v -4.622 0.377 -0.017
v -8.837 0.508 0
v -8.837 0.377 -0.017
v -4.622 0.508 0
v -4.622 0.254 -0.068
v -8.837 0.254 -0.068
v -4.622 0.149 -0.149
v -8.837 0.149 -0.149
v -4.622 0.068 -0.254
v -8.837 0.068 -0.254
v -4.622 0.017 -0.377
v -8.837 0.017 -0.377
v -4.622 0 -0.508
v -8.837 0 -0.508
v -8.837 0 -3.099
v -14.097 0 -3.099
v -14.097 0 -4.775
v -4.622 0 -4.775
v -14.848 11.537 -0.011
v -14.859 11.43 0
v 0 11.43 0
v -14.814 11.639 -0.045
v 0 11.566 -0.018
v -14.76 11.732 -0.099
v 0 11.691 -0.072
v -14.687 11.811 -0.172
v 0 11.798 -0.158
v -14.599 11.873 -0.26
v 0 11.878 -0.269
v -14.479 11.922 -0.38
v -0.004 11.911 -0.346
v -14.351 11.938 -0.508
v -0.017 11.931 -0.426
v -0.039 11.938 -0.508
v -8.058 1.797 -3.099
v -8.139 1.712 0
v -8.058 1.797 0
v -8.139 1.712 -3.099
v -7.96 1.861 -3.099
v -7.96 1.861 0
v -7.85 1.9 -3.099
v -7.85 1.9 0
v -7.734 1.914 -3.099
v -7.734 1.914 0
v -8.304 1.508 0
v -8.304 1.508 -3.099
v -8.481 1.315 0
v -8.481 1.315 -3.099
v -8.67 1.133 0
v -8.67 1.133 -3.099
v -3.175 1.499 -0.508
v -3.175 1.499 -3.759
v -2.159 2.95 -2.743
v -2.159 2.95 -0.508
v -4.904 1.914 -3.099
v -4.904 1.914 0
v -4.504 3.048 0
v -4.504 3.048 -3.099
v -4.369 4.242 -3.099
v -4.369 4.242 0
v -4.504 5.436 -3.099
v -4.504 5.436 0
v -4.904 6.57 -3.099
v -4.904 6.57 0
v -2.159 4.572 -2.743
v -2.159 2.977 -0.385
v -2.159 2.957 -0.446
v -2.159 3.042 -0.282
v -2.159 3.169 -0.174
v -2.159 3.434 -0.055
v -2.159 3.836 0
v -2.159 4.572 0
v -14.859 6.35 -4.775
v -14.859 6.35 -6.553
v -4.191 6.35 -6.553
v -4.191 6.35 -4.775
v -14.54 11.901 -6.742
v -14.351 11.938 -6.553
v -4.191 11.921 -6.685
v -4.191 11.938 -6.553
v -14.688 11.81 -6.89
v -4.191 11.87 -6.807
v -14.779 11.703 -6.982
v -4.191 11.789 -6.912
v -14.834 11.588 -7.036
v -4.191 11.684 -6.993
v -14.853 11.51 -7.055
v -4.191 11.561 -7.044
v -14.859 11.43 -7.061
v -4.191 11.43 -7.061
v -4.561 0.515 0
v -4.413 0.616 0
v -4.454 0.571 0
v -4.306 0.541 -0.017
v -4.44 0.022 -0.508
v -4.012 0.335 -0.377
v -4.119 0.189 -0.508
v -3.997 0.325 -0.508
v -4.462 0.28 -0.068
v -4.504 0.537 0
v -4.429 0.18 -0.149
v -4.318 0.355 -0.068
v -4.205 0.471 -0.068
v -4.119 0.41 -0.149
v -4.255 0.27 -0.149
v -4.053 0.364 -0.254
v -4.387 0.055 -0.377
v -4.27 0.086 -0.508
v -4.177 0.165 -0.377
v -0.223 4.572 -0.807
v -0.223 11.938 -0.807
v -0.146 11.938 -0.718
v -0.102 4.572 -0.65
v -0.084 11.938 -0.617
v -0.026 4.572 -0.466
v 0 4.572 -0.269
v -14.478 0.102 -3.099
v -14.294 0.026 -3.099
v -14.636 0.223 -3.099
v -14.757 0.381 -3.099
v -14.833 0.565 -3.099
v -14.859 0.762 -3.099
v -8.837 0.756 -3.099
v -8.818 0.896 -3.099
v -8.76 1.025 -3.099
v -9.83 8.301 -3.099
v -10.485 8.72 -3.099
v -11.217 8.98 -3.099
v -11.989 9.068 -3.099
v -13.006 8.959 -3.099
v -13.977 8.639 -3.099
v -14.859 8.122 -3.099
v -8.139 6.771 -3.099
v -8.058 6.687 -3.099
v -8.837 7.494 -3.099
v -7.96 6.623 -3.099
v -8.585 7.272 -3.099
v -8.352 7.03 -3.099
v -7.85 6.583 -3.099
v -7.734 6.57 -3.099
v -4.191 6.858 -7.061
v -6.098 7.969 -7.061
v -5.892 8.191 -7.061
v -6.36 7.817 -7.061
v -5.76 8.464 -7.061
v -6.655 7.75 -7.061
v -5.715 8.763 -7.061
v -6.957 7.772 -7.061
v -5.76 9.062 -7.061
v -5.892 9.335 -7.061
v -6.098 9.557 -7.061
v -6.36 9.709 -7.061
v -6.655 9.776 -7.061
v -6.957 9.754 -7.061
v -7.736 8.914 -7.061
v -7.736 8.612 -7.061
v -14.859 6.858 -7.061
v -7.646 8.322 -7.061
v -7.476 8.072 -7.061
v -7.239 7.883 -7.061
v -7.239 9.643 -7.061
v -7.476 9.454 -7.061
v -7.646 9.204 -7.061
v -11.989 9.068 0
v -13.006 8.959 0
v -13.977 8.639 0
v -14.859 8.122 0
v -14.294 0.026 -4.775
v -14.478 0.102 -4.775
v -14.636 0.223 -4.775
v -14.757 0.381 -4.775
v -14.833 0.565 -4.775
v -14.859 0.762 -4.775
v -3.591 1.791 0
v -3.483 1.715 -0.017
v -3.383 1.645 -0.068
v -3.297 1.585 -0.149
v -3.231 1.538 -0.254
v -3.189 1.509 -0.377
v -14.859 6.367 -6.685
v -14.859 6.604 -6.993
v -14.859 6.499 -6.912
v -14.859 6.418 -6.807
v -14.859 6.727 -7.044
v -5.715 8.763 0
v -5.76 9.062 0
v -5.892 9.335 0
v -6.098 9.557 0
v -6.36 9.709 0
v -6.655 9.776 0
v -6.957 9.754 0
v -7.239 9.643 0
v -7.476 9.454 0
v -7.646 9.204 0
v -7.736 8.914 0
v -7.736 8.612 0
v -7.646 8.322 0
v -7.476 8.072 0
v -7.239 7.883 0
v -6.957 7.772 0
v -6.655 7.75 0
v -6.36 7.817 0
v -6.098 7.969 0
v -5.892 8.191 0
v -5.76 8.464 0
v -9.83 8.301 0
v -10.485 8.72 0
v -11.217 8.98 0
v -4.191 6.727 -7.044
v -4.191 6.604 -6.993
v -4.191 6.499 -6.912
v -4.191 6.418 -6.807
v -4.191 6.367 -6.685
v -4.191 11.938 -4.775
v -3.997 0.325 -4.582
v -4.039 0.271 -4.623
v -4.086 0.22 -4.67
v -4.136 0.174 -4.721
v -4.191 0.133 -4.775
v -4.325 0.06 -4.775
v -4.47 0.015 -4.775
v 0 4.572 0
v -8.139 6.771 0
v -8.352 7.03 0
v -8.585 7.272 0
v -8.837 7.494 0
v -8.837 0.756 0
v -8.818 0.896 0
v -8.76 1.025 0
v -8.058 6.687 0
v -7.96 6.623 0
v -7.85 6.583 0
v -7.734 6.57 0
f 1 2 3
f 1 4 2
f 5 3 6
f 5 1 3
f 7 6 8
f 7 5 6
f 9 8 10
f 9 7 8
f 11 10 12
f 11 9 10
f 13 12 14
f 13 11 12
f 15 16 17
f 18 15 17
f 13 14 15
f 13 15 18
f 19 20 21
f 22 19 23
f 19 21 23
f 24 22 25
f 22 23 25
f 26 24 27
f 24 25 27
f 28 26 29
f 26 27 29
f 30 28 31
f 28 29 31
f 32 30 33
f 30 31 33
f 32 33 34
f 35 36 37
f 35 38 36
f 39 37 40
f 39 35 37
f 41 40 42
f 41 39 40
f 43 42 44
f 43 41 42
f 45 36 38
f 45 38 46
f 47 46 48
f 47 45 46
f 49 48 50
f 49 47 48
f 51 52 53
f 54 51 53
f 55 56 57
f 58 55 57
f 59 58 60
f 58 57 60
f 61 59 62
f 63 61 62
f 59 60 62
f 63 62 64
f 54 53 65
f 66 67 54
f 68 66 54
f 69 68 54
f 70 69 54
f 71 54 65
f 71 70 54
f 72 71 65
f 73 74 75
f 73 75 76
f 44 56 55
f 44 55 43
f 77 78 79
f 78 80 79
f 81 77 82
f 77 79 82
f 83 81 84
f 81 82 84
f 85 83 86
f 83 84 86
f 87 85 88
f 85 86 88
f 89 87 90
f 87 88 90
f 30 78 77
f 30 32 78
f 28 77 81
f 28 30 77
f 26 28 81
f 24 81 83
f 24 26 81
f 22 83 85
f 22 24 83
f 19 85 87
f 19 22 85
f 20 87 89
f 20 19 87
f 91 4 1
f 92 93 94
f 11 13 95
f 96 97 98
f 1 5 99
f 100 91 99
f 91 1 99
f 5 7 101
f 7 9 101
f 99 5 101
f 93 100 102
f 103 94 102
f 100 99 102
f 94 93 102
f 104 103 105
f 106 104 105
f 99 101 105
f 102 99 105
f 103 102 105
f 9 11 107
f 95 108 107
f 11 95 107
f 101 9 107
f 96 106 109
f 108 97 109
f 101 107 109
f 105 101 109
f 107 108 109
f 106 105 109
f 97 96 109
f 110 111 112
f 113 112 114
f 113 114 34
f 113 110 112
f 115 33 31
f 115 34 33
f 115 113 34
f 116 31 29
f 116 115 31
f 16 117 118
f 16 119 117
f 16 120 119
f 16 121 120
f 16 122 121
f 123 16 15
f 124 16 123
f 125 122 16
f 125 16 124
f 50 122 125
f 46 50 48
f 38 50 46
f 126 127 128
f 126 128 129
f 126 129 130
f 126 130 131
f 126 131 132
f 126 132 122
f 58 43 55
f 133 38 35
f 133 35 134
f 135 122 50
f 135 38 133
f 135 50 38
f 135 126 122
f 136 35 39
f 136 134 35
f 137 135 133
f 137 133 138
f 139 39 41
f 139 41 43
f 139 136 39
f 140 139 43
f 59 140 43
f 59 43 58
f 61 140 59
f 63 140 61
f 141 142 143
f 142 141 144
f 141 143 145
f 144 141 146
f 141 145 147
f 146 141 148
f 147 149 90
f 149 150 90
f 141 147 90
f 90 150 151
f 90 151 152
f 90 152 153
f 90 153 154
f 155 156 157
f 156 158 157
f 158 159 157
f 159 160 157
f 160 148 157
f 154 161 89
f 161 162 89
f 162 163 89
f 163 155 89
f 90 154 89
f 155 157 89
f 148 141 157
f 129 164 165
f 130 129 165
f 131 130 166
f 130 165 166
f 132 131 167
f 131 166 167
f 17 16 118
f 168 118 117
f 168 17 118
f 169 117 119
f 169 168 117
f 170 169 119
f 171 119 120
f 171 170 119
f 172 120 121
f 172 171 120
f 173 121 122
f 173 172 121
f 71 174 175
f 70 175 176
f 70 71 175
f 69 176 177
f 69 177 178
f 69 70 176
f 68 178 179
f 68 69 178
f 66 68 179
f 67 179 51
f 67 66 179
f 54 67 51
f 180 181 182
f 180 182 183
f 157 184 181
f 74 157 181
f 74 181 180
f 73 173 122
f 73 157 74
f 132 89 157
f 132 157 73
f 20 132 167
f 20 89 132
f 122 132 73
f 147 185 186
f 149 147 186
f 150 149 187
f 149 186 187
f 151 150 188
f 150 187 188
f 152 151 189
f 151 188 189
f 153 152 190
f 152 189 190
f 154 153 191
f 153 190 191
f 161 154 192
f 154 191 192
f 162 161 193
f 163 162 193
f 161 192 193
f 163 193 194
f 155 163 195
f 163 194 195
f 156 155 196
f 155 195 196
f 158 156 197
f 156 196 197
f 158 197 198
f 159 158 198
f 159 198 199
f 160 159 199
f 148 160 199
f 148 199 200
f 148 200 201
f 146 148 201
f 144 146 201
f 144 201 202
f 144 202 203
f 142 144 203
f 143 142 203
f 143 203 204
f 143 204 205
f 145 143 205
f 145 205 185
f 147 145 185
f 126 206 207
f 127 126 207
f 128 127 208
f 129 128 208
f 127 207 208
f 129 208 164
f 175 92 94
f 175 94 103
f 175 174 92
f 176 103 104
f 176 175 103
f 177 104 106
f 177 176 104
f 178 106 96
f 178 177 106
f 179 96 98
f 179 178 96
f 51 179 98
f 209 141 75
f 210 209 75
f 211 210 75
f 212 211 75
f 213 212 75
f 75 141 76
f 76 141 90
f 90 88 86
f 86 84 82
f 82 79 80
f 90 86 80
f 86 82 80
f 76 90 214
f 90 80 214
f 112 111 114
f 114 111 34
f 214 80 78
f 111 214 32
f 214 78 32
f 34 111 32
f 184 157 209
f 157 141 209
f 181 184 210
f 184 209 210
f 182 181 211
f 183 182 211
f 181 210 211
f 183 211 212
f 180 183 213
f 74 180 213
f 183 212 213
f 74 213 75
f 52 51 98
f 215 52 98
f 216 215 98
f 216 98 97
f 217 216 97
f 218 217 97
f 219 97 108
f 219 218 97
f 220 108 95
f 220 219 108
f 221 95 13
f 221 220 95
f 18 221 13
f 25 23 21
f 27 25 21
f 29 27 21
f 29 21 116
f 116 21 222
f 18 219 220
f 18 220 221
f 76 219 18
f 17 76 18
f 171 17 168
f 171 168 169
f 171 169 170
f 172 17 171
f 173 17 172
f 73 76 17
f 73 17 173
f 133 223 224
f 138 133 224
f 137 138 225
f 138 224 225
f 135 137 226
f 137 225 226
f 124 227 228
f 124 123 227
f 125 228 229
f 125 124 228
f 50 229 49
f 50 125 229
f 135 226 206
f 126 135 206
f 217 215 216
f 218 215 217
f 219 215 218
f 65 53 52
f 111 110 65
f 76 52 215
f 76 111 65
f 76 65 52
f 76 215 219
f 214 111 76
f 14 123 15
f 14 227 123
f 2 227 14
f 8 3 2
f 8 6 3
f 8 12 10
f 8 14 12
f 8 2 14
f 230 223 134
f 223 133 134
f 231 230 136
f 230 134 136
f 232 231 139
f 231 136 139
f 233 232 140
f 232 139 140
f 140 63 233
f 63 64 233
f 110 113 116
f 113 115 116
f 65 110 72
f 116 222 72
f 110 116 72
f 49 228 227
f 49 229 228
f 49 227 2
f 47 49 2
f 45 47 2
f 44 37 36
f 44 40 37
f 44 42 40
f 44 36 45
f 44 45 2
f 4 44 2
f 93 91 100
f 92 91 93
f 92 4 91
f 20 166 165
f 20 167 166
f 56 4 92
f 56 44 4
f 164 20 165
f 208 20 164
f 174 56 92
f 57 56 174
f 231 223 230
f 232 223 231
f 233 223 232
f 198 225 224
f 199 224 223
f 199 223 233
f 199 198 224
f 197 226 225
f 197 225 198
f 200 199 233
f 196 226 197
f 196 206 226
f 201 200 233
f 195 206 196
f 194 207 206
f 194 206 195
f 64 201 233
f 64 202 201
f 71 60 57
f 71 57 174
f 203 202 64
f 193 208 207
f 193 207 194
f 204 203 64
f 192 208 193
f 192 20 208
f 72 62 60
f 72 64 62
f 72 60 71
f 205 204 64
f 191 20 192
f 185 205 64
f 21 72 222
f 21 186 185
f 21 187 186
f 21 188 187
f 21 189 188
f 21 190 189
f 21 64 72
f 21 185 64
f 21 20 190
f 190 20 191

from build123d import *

# Parameters (mm, degrees)
EXTRUDE1_DEPTH  = 4.7752
EXTRUDE2_DEPTH  = 12.938
SKETCH33_W      = 2.286
SKETCH33_H      = 5.588
EXTRUDE30_DEPTH = 10.668
EXTRUDE3_DEPTH  = 3.0988
EXTRUDE6_DEPTH  = 3.0988
EXTRUDE7_DEPTH  = 3.0988
SKETCH23_W      = 3.0988
SKETCH23_H      = 1.133450424
EXTRUDE20_DEPTH = 2.54
EXTRUDE16_DEPTH = 3.0988
FILLET1_R       = 0.762
EXTRUDE21_DEPTH = 3.0988
FILLET2_R       = 0.762
EXTRUDE28_DEPTH = 8.0612
EXTRUDE29_REACH = 9.061
FILLET3_R       = 0.762
FILLET4_R       = 0.508
FILLET5_R       = 0.508
FILLET6_R       = 0.508
SKETCH35_R      = 1.016
EXTRUDE32_DEPTH = 8.0612


with BuildPart() as part:
    # Sketch1 → Extrude1 (new body)
    with BuildSketch(Plane.XY):
        Polygon((-14.859, 11.938), (0, 11.938), (0, 4.572), (-3.175, 4.572), (-3.175, 0), (-14.859, 0), align=None)
    extrude(amount=-EXTRUDE1_DEPTH)

    # Sketch2 → Extrude2 (cut, through all)
    with BuildSketch(Plane(origin=(0, 11.938, 0), x_dir=(1, 0, 0), z_dir=(0, 1, 0))):
        Polygon((0, 0.5842), (-4.191, 4.7752), (0, 4.7752), align=None)
    extrude(amount=-EXTRUDE2_DEPTH, mode=Mode.SUBTRACT)

    # Sketch33 → Extrude30 (add)
    with BuildSketch(Plane.ZY.offset(14.859)):
        with Locations((-5.9182, 9.144)):
            Rectangle(SKETCH33_W, SKETCH33_H)
    extrude(amount=-EXTRUDE30_DEPTH)

    # Sketch5 → Extrude3 (cut)
    with BuildSketch(Plane.XY):
        with BuildLine():
            Line((-14.859, 8.121520088), (-14.859, 0))
            Line((-14.859, 0), (-8.374207602, 0))
            ThreePointArc((-8.374207602, 0), (-5.258197931, 4.182323512), (-8.261178378, 8.44652973))
            ThreePointArc((-8.261178378, 8.44652973), (-10.099280239, 8.911418564), (-11.9888, 9.0678))
            ThreePointArc((-11.9888, 9.0678), (-13.499883528, 8.825128765), (-14.859, 8.121520088))
        make_face()
    extrude(amount=-EXTRUDE3_DEPTH, mode=Mode.SUBTRACT)

    # Sketch8 → Extrude6 (add)
    with BuildSketch(Plane.XY):
        with BuildLine():
            Line((-5.916117419, 6.569687461), (-7.995771884, 6.569687461))
            ThreePointArc((-7.995771884, 6.569687461), (-8.381805974, 7.063274265), (-8.837117419, 7.493787609))
            Line((-8.837117419, 7.493787609), (-8.837117419, 8.601687461))
            ThreePointArc((-8.837117419, 8.601687461), (-7.16441835, 7.890723622), (-5.916117419, 6.569687461))
        make_face()
    extrude(amount=-EXTRUDE6_DEPTH)

    # Sketch9 → Extrude7 (add)
    with BuildSketch(Plane.XY):
        with BuildLine():
            Line((-5.916117419, 1.913912539), (-7.995771884, 1.913912539))
            ThreePointArc((-7.995771884, 1.913912539), (-8.381805974, 1.420325735), (-8.837117419, 0.989812391))
            Line((-8.837117419, 0.989812391), (-8.837117419, 0))
            Line((-8.837117419, 0), (-8.374207602, 0))
            ThreePointArc((-8.374207602, 0), (-6.971998867, 0.734557469), (-5.916117419, 1.913912539))
        make_face()
    extrude(amount=-EXTRUDE7_DEPTH)

    # Sketch23 → Extrude20 (add)
    with BuildSketch(Plane.ZY.offset(8.837117419)):
        with Locations((-1.5494, 8.060512821)):
            Rectangle(SKETCH23_W, SKETCH23_H)
    extrude(amount=-EXTRUDE20_DEPTH)

    # Sketch18 → Extrude16 (cut)
    with BuildSketch(Plane.XY):
        with BuildLine():
            Line((-4.903581733, 6.569687461), (-5.916117419, 6.569687461))
            ThreePointArc((-5.916117419, 6.569687461), (-5.2578, 4.2418), (-5.916117419, 1.913912539))
            Line((-5.916117419, 1.913912539), (-4.903581733, 1.913912539))
            ThreePointArc((-4.903581733, 1.913912539), (-4.3688, 4.2418), (-4.903581733, 6.569687461))
        make_face()
    extrude(amount=-EXTRUDE16_DEPTH, mode=Mode.SUBTRACT)

    # Fillet1
    fillet1_edges = [part.edges().sort_by_distance(p)[0] for p in [
        (0, 8.255, -0.5842),
    ]]
    fillet(fillet1_edges, radius=FILLET1_R)

    # Sketch24 → Extrude21 (add)
    with BuildSketch(Plane.XY):
        with BuildLine():
            Line((-8.837117419, 7.493787609), (-9.830149409, 8.301066631))
            ThreePointArc((-9.830149409, 8.301066631), (-10.843412246, 8.870424655), (-11.9888, 9.0678))
            Line((-11.9888, 9.0678), (-8.837117419, 9.0678))
            Line((-8.837117419, 9.0678), (-8.837117419, 7.493787609))
        make_face()
    extrude(amount=-EXTRUDE21_DEPTH)

    # Fillet2
    fillet2_edges = [part.edges().sort_by_distance(p)[0] for p in [
        (-14.859, 0, -3.937),
    ]]
    fillet(fillet2_edges, radius=FILLET2_R)

    # Sketch31 → Extrude28 (cut, through all)
    with BuildSketch(Plane.XY):
        Polygon((-3.175, 1.499352844), (-4.224858164, 0), (-3.175, 0), align=None)
    extrude(amount=-EXTRUDE28_DEPTH, mode=Mode.SUBTRACT)

    # Extrude29: up to this face of the body (flat: up to its plane)
    extrude29_end = Plane(part.part.faces().sort_by_distance((-2.383005057, 7.601249614, -2.967205057))[0])
    # Sketch32 → Extrude29 (add, up to the picked face)
    with BuildSketch(Plane.XY, mode=Mode.PRIVATE) as extrude29_sk1:
        Polygon((-3.175, 1.499352844), (-2.159, 2.950351219), (-2.159, 4.572), (-3.175, 4.572), align=None)
    extrude29_tool1 = split(extrude(extrude29_sk1.sketch, amount=-EXTRUDE29_REACH, mode=Mode.PRIVATE), bisect_by=extrude29_end, keep=Keep.BOTH, mode=Mode.PRIVATE)
    add(extrude29_tool1.solids().sort_by_distance((-2.719341, 3.361051, 0))[0])

    # Fillet3
    fillet3_edges = [part.edges().sort_by_distance(p)[0] for p in [
        (-4.224858164, 0, -2.3876),
    ]]
    fillet(fillet3_edges, radius=FILLET3_R)

    # Fillet4
    fillet4_edges = [part.edges().sort_by_distance(p)[0] for p in [
        (-3.078168199, 1.637642987, 0),
        (-4.269677813, 0.086097745, 0),
        (-6.729323838, 0, 0),
    ]]
    fillet(fillet4_edges, radius=FILLET4_R)

    # Fillet5
    fillet5_edges = [part.edges().sort_by_distance(p)[0] for p in [
        (-9.525, 11.938, -7.0612),
        (-9.525, 6.35, -7.0612),
        (-7.4295, 11.938, 0),
        (-14.859, 11.938, -3.5306),
    ]]
    fillet(fillet5_edges, radius=FILLET5_R)

    # Fillet6
    fillet6_edges = [part.edges().sort_by_distance(p)[0] for p in [
        (-7.995771884, 6.569687461, -1.5494),
        (-8.837117419, 0.989812391, -1.5494),
        (-7.995771884, 1.913912539, -1.5494),
    ]]
    fillet(fillet6_edges, radius=FILLET6_R)

    # Sketch35 → Extrude32 (cut, through all)
    with BuildSketch(Plane.XY):
        with Locations((-6.731, 8.763)):
            Circle(SKETCH35_R)
    extrude(amount=-EXTRUDE32_DEPTH, mode=Mode.SUBTRACT)


solid = part.part
